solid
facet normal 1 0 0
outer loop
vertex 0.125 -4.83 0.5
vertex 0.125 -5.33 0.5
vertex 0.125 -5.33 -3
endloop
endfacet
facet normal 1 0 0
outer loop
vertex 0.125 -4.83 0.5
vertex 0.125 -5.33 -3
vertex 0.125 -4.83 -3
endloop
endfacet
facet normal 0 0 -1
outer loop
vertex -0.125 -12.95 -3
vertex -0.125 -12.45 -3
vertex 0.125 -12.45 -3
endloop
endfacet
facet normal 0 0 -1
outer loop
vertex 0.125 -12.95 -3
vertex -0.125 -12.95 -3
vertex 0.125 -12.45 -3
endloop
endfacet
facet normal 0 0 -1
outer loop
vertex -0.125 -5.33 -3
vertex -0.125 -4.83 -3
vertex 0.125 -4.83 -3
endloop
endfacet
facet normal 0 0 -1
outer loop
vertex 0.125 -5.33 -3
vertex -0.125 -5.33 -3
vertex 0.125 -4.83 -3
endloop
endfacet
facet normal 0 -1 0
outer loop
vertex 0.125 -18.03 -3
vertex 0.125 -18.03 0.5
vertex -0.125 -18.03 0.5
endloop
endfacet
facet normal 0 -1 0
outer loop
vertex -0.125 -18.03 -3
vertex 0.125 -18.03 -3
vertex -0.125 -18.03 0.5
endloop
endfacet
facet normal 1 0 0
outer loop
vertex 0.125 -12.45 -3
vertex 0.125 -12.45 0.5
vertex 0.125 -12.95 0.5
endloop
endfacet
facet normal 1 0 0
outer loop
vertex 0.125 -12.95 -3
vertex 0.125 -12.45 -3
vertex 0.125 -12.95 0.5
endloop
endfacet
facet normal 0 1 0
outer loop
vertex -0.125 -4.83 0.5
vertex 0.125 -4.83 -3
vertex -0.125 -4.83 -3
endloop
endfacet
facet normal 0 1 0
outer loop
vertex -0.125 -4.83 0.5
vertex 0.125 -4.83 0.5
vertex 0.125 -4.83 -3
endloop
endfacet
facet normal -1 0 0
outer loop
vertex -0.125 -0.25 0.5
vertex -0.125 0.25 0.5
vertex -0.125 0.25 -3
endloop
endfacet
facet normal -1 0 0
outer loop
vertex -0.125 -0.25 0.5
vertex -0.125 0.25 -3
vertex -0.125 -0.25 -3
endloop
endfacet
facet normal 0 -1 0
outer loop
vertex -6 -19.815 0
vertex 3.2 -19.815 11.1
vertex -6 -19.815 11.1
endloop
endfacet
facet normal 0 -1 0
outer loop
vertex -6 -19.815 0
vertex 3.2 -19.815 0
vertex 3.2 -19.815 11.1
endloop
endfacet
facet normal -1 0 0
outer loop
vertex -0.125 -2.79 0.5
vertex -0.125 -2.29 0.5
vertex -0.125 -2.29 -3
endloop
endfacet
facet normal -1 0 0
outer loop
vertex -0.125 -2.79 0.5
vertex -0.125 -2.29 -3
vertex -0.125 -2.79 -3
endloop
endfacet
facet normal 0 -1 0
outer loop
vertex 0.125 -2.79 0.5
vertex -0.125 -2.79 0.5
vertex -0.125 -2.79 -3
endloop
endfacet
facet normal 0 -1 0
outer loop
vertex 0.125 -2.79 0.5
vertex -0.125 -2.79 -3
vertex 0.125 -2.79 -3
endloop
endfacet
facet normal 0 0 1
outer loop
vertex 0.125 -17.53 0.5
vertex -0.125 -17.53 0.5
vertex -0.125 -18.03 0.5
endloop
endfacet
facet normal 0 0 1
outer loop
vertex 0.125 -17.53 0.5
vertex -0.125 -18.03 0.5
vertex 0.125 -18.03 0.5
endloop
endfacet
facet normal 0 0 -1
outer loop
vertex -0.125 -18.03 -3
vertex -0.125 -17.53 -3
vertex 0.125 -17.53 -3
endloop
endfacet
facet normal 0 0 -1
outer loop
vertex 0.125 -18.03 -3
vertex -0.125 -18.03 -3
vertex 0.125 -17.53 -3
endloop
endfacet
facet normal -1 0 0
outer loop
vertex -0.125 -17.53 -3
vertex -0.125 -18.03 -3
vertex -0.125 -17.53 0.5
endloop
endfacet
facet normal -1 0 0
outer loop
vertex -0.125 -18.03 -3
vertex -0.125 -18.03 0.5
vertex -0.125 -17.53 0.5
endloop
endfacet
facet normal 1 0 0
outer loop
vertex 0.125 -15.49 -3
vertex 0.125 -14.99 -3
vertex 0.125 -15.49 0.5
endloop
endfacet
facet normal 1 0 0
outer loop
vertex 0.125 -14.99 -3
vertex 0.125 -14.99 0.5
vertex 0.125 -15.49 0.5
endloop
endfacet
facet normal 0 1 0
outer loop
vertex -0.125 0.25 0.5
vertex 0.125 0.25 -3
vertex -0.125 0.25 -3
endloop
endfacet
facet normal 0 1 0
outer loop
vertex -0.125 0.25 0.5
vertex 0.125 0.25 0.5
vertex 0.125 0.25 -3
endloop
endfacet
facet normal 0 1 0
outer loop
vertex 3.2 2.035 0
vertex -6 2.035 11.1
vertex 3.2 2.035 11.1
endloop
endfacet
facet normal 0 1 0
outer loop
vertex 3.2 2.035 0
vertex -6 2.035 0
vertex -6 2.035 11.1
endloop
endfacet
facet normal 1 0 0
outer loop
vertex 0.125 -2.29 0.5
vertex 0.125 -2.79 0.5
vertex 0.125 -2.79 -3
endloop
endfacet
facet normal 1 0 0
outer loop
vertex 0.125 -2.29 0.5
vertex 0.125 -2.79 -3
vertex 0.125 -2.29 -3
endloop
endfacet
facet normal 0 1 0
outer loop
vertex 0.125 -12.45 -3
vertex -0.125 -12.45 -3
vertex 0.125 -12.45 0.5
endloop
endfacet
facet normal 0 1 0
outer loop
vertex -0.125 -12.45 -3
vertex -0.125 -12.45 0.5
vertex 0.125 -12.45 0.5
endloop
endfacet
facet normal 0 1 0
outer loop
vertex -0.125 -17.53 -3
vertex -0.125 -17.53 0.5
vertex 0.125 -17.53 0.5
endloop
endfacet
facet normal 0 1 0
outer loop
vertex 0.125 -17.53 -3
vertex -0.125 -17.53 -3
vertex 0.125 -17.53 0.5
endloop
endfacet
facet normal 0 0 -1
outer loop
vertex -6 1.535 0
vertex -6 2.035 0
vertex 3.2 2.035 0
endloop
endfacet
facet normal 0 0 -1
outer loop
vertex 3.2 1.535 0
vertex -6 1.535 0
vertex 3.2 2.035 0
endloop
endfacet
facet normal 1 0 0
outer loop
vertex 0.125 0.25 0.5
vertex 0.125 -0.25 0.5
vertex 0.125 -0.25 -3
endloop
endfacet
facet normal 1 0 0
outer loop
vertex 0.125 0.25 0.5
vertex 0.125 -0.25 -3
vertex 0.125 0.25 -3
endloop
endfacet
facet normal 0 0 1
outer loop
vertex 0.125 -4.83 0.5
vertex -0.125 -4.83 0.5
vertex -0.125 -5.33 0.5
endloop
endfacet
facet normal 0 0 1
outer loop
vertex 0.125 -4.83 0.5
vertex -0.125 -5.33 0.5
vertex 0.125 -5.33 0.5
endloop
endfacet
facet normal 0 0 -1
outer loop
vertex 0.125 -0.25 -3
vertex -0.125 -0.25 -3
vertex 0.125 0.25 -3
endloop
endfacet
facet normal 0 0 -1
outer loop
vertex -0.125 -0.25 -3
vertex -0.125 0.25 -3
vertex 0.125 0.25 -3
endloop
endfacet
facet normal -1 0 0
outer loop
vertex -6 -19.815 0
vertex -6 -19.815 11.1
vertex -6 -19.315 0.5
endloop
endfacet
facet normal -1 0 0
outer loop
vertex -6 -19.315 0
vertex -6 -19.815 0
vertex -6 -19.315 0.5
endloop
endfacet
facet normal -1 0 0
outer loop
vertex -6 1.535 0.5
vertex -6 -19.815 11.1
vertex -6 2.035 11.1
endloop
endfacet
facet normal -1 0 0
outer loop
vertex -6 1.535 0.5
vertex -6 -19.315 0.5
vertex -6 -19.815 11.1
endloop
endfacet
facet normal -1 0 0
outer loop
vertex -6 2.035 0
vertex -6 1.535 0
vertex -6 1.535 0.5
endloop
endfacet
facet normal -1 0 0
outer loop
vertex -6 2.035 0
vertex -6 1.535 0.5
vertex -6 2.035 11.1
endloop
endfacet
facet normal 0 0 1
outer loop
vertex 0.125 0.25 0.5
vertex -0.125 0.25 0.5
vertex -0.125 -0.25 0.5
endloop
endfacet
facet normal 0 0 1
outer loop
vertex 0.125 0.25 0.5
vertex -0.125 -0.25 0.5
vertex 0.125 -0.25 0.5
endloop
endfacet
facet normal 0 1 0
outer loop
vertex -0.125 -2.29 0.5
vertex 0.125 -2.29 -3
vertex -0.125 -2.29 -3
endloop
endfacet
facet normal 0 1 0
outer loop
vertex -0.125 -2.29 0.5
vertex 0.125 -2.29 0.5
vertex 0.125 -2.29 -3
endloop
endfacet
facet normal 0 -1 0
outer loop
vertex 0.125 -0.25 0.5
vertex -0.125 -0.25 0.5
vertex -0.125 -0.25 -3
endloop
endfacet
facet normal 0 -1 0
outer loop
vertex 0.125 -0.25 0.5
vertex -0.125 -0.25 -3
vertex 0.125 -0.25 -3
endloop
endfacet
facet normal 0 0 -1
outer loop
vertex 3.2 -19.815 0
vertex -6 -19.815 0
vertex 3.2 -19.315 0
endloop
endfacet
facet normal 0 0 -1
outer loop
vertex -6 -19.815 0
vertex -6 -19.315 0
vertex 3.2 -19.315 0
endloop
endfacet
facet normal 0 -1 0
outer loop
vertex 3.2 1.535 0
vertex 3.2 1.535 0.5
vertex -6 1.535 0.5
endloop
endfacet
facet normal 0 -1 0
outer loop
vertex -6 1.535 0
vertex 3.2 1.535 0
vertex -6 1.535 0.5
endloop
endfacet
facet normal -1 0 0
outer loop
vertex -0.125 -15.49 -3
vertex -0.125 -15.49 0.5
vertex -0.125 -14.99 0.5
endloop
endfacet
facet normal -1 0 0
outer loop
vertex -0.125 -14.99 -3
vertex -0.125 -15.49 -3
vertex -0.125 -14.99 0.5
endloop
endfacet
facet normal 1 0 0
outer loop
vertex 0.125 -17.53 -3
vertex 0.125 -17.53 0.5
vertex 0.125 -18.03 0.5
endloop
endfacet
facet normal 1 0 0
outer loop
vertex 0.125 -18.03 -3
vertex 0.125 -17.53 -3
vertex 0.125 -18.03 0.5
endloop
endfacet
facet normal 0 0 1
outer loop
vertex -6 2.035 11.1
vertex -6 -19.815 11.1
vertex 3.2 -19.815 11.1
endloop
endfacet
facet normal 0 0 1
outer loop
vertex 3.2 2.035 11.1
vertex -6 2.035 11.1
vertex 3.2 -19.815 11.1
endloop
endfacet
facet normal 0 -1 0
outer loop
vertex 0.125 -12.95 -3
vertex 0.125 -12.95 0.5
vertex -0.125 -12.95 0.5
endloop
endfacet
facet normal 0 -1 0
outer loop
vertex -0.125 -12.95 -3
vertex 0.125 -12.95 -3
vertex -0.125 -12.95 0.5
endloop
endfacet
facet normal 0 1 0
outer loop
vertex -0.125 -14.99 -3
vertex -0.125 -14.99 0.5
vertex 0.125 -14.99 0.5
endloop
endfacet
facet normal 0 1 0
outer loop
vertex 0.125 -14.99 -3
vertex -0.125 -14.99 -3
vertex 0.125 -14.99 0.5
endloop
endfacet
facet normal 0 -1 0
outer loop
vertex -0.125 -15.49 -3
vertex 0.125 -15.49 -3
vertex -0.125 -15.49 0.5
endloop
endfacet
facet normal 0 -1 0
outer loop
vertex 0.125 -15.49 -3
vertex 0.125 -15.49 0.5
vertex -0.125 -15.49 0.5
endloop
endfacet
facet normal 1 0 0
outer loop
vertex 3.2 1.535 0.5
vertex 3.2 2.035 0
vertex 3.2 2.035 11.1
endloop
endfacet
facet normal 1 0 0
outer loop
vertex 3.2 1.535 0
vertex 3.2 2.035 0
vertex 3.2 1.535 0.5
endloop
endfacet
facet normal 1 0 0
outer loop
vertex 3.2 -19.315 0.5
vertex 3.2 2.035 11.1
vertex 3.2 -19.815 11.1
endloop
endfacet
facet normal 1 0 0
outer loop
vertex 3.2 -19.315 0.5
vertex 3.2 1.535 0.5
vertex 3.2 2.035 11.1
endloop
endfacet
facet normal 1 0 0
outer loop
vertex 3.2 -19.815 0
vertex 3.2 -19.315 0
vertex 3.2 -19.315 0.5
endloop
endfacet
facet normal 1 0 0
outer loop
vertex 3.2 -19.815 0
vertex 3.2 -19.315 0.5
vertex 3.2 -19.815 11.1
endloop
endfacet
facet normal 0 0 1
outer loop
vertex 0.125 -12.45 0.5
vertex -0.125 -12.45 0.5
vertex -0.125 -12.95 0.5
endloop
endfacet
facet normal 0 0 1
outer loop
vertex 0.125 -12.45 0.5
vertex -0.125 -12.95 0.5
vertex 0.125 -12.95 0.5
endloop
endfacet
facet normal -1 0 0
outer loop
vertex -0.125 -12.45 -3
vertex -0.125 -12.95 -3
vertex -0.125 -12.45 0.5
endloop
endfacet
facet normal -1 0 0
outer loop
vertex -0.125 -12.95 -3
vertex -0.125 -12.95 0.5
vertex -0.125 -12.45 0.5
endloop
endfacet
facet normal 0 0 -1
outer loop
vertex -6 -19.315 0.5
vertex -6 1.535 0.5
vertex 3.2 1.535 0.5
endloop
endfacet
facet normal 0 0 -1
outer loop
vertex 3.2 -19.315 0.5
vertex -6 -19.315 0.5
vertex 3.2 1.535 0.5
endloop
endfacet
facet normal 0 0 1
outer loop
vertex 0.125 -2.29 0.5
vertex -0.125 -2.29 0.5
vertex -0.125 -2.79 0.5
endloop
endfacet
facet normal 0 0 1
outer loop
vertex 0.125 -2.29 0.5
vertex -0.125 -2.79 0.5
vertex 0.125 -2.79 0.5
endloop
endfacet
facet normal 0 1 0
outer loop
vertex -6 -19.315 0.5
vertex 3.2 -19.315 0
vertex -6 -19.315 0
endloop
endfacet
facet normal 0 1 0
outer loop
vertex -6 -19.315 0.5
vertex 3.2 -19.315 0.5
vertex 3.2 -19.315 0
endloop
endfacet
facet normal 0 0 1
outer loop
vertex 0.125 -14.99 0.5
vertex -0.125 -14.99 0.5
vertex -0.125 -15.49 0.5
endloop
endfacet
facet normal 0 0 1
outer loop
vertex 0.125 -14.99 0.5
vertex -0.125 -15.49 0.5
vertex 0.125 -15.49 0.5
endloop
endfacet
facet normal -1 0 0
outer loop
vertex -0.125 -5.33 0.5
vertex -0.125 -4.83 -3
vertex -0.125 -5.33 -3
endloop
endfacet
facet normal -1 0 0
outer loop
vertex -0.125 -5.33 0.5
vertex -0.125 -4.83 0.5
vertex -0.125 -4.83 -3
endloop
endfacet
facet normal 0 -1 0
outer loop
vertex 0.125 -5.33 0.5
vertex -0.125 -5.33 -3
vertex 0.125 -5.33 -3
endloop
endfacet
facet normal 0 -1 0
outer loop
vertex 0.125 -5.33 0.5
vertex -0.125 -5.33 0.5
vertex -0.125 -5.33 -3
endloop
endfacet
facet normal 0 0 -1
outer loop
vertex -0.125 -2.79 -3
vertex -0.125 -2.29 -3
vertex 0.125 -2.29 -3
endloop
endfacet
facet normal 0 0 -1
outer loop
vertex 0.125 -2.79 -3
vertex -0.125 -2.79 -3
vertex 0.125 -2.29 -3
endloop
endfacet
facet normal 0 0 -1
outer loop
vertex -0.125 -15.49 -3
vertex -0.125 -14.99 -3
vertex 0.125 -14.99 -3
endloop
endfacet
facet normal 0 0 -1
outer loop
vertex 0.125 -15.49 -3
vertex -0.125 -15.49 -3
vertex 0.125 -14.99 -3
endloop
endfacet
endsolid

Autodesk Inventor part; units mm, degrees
ref_plane "YZ Plane" through (0, 0, 0) normal (1, 0, 0) x (0, 1, 0)
ref_plane "XZ Plane" through (0, 0, 0) normal (0, 1, 0) x (-1, 0, 0)
ref_plane "XY Plane" through (0, 0, 0) normal (0, 0, 1) x (1, 0, 0)
sketch "Sketch2" plane through (0, 0, 0) normal (0, 0, 1) x (1, 0, 0)
  line L0 (-6, 2.035) -> (3.2, 2.035)
  line L1 (3.2, 2.035) -> (3.2, -19.815)
  line L2 (3.2, -19.815) -> (-6, -19.815)
  line L3 (-6, -19.815) -> (-6, 2.035)
  line L4 (-0.125, -0.25) -> (0.125, -0.25)
  line L5 (0.125, -0.25) -> (0.125, 0.25)
  line L6 (0.125, 0.25) -> (-0.125, 0.25)
  line L7 (-0.125, 0.25) -> (-0.125, -0.25)
  line L8 (-0.125, -0.25) -> (0.125, 0.25) construction
  line L9 (0.125, -0.25) -> (-0.125, 0.25) construction
  line L10 (-0.125, -2.79) -> (0.125, -2.79)
  line L11 (0.125, -2.79) -> (0.125, -2.29)
  line L12 (0.125, -2.29) -> (-0.125, -2.29)
  line L13 (-0.125, -2.29) -> (-0.125, -2.79)
  line L14 (-0.125, -2.79) -> (0.125, -2.29) construction
  line L15 (0.125, -2.79) -> (-0.125, -2.29) construction
  line L16 (-0.125, -12.45) -> (0.125, -12.45)
  line L17 (0.125, -12.45) -> (0.125, -12.95)
  line L18 (0.125, -12.95) -> (-0.125, -12.95)
  line L19 (-0.125, -12.95) -> (-0.125, -12.45)
  line L20 (-0.125, -12.45) -> (0.125, -12.95) construction
  line L21 (0.125, -12.45) -> (-0.125, -12.95) construction
  line L22 (-0.125, -14.99) -> (0.125, -14.99)
  line L23 (0.125, -14.99) -> (0.125, -15.49)
  line L24 (-0.125, -15.49) -> (-0.125, -14.99)
  line L25 (-0.125, -14.99) -> (0.125, -15.49) construction
  line L26 (0.125, -14.99) -> (-0.125, -15.49) construction
  line L27 (0.125, -15.49) -> (-0.125, -15.49)
  line L28 (-0.125, -17.53) -> (0.125, -17.53)
  line L29 (0.125, -17.53) -> (0.125, -18.03)
  line L30 (-0.125, -18.03) -> (-0.125, -17.53)
  line L31 (-0.125, -17.53) -> (0.125, -18.03) construction
  line L32 (0.125, -17.53) -> (-0.125, -18.03) construction
  line L33 (0.125, -18.03) -> (-0.125, -18.03)
  line L34 (-6, 2.035) -> (3.2, 2.035)
  line L35 (3.2, 2.035) -> (3.2, 1.535)
  line L36 (3.2, 1.535) -> (-6, 1.535)
  line L37 (-6, 1.535) -> (-6, 2.035)
  line L38 (-6, -19.815) -> (3.2, -19.815)
  line L39 (3.2, -19.815) -> (3.2, -19.315)
  line L40 (3.2, -19.315) -> (-6, -19.315)
  line L41 (-6, -19.315) -> (-6, -19.815)
  line L42 (-0.125, -5.33) -> (0.125, -5.33)
  line L43 (0.125, -5.33) -> (0.125, -4.83)
  line L44 (0.125, -4.83) -> (-0.125, -4.83)
  line L45 (-0.125, -4.83) -> (-0.125, -5.33)
  line L46 (-0.125, -5.33) -> (0.125, -4.83) construction
  line L47 (0.125, -5.33) -> (-0.125, -4.83) construction
  point P0 (0, 0)
  point P1 (0, -2.54)
  point P2 (0, -12.7)
  point P3 (0, -15.24)
  point P4 (0, -17.78)
  point P5 (0, -5.08)
  dimension "d37" = 2.035
  dimension "d38" = 3.2
  dimension "d40" = 9.2
  dimension "d41" = 0.25
  dimension "d42" = 0.5
  dimension "d45" = 2.54
  dimension "d50" = 0.25
  dimension "d51" = 0.5
  dimension "d52" = 0
  dimension "d53" = 12.7
  dimension "d56" = 2.54
  dimension "d61" = 0.5
  dimension "d62" = 0.5
  dimension "d72" = 21.85
extrude "Extrusion4" add sketch "Sketch2" along normal blind 10.6 contours L0 L1 L36 L3 | L36 L1 L40 L3 | L40 L1 L2 L3 | L7 L6 L5 L4 | L13 L12 L11 L10 | L16 L17 L18 L19 | L22 L23 L27 L24 | L28 L29 L33 L30 | L45 L44 L43 L42
extrude "Extrusion5" add sketch "Sketch2" against normal blind 0.5 contours L0 L1 L36 L3 | L40 L1 L2 L3
extrude "Extrusion6" add sketch "Sketch2" against normal blind 3.5 separate body contours L7 L6 L5 L4 | L13 L12 L11 L10 | L16 L17 L18 L19 | L22 L23 L27 L24 | L28 L29 L33 L30 | L45 L44 L43 L42
move or copy body "Move Body1" bodies to move or copy 1 2 copy no translate (0, 0, 0.5)
equation "\"d50\" = d41"
equation "\"d51\" = d42"
properties part number "Converter_DCDC_XP_POWER-ITQxxxx-H_SIP_THT"
